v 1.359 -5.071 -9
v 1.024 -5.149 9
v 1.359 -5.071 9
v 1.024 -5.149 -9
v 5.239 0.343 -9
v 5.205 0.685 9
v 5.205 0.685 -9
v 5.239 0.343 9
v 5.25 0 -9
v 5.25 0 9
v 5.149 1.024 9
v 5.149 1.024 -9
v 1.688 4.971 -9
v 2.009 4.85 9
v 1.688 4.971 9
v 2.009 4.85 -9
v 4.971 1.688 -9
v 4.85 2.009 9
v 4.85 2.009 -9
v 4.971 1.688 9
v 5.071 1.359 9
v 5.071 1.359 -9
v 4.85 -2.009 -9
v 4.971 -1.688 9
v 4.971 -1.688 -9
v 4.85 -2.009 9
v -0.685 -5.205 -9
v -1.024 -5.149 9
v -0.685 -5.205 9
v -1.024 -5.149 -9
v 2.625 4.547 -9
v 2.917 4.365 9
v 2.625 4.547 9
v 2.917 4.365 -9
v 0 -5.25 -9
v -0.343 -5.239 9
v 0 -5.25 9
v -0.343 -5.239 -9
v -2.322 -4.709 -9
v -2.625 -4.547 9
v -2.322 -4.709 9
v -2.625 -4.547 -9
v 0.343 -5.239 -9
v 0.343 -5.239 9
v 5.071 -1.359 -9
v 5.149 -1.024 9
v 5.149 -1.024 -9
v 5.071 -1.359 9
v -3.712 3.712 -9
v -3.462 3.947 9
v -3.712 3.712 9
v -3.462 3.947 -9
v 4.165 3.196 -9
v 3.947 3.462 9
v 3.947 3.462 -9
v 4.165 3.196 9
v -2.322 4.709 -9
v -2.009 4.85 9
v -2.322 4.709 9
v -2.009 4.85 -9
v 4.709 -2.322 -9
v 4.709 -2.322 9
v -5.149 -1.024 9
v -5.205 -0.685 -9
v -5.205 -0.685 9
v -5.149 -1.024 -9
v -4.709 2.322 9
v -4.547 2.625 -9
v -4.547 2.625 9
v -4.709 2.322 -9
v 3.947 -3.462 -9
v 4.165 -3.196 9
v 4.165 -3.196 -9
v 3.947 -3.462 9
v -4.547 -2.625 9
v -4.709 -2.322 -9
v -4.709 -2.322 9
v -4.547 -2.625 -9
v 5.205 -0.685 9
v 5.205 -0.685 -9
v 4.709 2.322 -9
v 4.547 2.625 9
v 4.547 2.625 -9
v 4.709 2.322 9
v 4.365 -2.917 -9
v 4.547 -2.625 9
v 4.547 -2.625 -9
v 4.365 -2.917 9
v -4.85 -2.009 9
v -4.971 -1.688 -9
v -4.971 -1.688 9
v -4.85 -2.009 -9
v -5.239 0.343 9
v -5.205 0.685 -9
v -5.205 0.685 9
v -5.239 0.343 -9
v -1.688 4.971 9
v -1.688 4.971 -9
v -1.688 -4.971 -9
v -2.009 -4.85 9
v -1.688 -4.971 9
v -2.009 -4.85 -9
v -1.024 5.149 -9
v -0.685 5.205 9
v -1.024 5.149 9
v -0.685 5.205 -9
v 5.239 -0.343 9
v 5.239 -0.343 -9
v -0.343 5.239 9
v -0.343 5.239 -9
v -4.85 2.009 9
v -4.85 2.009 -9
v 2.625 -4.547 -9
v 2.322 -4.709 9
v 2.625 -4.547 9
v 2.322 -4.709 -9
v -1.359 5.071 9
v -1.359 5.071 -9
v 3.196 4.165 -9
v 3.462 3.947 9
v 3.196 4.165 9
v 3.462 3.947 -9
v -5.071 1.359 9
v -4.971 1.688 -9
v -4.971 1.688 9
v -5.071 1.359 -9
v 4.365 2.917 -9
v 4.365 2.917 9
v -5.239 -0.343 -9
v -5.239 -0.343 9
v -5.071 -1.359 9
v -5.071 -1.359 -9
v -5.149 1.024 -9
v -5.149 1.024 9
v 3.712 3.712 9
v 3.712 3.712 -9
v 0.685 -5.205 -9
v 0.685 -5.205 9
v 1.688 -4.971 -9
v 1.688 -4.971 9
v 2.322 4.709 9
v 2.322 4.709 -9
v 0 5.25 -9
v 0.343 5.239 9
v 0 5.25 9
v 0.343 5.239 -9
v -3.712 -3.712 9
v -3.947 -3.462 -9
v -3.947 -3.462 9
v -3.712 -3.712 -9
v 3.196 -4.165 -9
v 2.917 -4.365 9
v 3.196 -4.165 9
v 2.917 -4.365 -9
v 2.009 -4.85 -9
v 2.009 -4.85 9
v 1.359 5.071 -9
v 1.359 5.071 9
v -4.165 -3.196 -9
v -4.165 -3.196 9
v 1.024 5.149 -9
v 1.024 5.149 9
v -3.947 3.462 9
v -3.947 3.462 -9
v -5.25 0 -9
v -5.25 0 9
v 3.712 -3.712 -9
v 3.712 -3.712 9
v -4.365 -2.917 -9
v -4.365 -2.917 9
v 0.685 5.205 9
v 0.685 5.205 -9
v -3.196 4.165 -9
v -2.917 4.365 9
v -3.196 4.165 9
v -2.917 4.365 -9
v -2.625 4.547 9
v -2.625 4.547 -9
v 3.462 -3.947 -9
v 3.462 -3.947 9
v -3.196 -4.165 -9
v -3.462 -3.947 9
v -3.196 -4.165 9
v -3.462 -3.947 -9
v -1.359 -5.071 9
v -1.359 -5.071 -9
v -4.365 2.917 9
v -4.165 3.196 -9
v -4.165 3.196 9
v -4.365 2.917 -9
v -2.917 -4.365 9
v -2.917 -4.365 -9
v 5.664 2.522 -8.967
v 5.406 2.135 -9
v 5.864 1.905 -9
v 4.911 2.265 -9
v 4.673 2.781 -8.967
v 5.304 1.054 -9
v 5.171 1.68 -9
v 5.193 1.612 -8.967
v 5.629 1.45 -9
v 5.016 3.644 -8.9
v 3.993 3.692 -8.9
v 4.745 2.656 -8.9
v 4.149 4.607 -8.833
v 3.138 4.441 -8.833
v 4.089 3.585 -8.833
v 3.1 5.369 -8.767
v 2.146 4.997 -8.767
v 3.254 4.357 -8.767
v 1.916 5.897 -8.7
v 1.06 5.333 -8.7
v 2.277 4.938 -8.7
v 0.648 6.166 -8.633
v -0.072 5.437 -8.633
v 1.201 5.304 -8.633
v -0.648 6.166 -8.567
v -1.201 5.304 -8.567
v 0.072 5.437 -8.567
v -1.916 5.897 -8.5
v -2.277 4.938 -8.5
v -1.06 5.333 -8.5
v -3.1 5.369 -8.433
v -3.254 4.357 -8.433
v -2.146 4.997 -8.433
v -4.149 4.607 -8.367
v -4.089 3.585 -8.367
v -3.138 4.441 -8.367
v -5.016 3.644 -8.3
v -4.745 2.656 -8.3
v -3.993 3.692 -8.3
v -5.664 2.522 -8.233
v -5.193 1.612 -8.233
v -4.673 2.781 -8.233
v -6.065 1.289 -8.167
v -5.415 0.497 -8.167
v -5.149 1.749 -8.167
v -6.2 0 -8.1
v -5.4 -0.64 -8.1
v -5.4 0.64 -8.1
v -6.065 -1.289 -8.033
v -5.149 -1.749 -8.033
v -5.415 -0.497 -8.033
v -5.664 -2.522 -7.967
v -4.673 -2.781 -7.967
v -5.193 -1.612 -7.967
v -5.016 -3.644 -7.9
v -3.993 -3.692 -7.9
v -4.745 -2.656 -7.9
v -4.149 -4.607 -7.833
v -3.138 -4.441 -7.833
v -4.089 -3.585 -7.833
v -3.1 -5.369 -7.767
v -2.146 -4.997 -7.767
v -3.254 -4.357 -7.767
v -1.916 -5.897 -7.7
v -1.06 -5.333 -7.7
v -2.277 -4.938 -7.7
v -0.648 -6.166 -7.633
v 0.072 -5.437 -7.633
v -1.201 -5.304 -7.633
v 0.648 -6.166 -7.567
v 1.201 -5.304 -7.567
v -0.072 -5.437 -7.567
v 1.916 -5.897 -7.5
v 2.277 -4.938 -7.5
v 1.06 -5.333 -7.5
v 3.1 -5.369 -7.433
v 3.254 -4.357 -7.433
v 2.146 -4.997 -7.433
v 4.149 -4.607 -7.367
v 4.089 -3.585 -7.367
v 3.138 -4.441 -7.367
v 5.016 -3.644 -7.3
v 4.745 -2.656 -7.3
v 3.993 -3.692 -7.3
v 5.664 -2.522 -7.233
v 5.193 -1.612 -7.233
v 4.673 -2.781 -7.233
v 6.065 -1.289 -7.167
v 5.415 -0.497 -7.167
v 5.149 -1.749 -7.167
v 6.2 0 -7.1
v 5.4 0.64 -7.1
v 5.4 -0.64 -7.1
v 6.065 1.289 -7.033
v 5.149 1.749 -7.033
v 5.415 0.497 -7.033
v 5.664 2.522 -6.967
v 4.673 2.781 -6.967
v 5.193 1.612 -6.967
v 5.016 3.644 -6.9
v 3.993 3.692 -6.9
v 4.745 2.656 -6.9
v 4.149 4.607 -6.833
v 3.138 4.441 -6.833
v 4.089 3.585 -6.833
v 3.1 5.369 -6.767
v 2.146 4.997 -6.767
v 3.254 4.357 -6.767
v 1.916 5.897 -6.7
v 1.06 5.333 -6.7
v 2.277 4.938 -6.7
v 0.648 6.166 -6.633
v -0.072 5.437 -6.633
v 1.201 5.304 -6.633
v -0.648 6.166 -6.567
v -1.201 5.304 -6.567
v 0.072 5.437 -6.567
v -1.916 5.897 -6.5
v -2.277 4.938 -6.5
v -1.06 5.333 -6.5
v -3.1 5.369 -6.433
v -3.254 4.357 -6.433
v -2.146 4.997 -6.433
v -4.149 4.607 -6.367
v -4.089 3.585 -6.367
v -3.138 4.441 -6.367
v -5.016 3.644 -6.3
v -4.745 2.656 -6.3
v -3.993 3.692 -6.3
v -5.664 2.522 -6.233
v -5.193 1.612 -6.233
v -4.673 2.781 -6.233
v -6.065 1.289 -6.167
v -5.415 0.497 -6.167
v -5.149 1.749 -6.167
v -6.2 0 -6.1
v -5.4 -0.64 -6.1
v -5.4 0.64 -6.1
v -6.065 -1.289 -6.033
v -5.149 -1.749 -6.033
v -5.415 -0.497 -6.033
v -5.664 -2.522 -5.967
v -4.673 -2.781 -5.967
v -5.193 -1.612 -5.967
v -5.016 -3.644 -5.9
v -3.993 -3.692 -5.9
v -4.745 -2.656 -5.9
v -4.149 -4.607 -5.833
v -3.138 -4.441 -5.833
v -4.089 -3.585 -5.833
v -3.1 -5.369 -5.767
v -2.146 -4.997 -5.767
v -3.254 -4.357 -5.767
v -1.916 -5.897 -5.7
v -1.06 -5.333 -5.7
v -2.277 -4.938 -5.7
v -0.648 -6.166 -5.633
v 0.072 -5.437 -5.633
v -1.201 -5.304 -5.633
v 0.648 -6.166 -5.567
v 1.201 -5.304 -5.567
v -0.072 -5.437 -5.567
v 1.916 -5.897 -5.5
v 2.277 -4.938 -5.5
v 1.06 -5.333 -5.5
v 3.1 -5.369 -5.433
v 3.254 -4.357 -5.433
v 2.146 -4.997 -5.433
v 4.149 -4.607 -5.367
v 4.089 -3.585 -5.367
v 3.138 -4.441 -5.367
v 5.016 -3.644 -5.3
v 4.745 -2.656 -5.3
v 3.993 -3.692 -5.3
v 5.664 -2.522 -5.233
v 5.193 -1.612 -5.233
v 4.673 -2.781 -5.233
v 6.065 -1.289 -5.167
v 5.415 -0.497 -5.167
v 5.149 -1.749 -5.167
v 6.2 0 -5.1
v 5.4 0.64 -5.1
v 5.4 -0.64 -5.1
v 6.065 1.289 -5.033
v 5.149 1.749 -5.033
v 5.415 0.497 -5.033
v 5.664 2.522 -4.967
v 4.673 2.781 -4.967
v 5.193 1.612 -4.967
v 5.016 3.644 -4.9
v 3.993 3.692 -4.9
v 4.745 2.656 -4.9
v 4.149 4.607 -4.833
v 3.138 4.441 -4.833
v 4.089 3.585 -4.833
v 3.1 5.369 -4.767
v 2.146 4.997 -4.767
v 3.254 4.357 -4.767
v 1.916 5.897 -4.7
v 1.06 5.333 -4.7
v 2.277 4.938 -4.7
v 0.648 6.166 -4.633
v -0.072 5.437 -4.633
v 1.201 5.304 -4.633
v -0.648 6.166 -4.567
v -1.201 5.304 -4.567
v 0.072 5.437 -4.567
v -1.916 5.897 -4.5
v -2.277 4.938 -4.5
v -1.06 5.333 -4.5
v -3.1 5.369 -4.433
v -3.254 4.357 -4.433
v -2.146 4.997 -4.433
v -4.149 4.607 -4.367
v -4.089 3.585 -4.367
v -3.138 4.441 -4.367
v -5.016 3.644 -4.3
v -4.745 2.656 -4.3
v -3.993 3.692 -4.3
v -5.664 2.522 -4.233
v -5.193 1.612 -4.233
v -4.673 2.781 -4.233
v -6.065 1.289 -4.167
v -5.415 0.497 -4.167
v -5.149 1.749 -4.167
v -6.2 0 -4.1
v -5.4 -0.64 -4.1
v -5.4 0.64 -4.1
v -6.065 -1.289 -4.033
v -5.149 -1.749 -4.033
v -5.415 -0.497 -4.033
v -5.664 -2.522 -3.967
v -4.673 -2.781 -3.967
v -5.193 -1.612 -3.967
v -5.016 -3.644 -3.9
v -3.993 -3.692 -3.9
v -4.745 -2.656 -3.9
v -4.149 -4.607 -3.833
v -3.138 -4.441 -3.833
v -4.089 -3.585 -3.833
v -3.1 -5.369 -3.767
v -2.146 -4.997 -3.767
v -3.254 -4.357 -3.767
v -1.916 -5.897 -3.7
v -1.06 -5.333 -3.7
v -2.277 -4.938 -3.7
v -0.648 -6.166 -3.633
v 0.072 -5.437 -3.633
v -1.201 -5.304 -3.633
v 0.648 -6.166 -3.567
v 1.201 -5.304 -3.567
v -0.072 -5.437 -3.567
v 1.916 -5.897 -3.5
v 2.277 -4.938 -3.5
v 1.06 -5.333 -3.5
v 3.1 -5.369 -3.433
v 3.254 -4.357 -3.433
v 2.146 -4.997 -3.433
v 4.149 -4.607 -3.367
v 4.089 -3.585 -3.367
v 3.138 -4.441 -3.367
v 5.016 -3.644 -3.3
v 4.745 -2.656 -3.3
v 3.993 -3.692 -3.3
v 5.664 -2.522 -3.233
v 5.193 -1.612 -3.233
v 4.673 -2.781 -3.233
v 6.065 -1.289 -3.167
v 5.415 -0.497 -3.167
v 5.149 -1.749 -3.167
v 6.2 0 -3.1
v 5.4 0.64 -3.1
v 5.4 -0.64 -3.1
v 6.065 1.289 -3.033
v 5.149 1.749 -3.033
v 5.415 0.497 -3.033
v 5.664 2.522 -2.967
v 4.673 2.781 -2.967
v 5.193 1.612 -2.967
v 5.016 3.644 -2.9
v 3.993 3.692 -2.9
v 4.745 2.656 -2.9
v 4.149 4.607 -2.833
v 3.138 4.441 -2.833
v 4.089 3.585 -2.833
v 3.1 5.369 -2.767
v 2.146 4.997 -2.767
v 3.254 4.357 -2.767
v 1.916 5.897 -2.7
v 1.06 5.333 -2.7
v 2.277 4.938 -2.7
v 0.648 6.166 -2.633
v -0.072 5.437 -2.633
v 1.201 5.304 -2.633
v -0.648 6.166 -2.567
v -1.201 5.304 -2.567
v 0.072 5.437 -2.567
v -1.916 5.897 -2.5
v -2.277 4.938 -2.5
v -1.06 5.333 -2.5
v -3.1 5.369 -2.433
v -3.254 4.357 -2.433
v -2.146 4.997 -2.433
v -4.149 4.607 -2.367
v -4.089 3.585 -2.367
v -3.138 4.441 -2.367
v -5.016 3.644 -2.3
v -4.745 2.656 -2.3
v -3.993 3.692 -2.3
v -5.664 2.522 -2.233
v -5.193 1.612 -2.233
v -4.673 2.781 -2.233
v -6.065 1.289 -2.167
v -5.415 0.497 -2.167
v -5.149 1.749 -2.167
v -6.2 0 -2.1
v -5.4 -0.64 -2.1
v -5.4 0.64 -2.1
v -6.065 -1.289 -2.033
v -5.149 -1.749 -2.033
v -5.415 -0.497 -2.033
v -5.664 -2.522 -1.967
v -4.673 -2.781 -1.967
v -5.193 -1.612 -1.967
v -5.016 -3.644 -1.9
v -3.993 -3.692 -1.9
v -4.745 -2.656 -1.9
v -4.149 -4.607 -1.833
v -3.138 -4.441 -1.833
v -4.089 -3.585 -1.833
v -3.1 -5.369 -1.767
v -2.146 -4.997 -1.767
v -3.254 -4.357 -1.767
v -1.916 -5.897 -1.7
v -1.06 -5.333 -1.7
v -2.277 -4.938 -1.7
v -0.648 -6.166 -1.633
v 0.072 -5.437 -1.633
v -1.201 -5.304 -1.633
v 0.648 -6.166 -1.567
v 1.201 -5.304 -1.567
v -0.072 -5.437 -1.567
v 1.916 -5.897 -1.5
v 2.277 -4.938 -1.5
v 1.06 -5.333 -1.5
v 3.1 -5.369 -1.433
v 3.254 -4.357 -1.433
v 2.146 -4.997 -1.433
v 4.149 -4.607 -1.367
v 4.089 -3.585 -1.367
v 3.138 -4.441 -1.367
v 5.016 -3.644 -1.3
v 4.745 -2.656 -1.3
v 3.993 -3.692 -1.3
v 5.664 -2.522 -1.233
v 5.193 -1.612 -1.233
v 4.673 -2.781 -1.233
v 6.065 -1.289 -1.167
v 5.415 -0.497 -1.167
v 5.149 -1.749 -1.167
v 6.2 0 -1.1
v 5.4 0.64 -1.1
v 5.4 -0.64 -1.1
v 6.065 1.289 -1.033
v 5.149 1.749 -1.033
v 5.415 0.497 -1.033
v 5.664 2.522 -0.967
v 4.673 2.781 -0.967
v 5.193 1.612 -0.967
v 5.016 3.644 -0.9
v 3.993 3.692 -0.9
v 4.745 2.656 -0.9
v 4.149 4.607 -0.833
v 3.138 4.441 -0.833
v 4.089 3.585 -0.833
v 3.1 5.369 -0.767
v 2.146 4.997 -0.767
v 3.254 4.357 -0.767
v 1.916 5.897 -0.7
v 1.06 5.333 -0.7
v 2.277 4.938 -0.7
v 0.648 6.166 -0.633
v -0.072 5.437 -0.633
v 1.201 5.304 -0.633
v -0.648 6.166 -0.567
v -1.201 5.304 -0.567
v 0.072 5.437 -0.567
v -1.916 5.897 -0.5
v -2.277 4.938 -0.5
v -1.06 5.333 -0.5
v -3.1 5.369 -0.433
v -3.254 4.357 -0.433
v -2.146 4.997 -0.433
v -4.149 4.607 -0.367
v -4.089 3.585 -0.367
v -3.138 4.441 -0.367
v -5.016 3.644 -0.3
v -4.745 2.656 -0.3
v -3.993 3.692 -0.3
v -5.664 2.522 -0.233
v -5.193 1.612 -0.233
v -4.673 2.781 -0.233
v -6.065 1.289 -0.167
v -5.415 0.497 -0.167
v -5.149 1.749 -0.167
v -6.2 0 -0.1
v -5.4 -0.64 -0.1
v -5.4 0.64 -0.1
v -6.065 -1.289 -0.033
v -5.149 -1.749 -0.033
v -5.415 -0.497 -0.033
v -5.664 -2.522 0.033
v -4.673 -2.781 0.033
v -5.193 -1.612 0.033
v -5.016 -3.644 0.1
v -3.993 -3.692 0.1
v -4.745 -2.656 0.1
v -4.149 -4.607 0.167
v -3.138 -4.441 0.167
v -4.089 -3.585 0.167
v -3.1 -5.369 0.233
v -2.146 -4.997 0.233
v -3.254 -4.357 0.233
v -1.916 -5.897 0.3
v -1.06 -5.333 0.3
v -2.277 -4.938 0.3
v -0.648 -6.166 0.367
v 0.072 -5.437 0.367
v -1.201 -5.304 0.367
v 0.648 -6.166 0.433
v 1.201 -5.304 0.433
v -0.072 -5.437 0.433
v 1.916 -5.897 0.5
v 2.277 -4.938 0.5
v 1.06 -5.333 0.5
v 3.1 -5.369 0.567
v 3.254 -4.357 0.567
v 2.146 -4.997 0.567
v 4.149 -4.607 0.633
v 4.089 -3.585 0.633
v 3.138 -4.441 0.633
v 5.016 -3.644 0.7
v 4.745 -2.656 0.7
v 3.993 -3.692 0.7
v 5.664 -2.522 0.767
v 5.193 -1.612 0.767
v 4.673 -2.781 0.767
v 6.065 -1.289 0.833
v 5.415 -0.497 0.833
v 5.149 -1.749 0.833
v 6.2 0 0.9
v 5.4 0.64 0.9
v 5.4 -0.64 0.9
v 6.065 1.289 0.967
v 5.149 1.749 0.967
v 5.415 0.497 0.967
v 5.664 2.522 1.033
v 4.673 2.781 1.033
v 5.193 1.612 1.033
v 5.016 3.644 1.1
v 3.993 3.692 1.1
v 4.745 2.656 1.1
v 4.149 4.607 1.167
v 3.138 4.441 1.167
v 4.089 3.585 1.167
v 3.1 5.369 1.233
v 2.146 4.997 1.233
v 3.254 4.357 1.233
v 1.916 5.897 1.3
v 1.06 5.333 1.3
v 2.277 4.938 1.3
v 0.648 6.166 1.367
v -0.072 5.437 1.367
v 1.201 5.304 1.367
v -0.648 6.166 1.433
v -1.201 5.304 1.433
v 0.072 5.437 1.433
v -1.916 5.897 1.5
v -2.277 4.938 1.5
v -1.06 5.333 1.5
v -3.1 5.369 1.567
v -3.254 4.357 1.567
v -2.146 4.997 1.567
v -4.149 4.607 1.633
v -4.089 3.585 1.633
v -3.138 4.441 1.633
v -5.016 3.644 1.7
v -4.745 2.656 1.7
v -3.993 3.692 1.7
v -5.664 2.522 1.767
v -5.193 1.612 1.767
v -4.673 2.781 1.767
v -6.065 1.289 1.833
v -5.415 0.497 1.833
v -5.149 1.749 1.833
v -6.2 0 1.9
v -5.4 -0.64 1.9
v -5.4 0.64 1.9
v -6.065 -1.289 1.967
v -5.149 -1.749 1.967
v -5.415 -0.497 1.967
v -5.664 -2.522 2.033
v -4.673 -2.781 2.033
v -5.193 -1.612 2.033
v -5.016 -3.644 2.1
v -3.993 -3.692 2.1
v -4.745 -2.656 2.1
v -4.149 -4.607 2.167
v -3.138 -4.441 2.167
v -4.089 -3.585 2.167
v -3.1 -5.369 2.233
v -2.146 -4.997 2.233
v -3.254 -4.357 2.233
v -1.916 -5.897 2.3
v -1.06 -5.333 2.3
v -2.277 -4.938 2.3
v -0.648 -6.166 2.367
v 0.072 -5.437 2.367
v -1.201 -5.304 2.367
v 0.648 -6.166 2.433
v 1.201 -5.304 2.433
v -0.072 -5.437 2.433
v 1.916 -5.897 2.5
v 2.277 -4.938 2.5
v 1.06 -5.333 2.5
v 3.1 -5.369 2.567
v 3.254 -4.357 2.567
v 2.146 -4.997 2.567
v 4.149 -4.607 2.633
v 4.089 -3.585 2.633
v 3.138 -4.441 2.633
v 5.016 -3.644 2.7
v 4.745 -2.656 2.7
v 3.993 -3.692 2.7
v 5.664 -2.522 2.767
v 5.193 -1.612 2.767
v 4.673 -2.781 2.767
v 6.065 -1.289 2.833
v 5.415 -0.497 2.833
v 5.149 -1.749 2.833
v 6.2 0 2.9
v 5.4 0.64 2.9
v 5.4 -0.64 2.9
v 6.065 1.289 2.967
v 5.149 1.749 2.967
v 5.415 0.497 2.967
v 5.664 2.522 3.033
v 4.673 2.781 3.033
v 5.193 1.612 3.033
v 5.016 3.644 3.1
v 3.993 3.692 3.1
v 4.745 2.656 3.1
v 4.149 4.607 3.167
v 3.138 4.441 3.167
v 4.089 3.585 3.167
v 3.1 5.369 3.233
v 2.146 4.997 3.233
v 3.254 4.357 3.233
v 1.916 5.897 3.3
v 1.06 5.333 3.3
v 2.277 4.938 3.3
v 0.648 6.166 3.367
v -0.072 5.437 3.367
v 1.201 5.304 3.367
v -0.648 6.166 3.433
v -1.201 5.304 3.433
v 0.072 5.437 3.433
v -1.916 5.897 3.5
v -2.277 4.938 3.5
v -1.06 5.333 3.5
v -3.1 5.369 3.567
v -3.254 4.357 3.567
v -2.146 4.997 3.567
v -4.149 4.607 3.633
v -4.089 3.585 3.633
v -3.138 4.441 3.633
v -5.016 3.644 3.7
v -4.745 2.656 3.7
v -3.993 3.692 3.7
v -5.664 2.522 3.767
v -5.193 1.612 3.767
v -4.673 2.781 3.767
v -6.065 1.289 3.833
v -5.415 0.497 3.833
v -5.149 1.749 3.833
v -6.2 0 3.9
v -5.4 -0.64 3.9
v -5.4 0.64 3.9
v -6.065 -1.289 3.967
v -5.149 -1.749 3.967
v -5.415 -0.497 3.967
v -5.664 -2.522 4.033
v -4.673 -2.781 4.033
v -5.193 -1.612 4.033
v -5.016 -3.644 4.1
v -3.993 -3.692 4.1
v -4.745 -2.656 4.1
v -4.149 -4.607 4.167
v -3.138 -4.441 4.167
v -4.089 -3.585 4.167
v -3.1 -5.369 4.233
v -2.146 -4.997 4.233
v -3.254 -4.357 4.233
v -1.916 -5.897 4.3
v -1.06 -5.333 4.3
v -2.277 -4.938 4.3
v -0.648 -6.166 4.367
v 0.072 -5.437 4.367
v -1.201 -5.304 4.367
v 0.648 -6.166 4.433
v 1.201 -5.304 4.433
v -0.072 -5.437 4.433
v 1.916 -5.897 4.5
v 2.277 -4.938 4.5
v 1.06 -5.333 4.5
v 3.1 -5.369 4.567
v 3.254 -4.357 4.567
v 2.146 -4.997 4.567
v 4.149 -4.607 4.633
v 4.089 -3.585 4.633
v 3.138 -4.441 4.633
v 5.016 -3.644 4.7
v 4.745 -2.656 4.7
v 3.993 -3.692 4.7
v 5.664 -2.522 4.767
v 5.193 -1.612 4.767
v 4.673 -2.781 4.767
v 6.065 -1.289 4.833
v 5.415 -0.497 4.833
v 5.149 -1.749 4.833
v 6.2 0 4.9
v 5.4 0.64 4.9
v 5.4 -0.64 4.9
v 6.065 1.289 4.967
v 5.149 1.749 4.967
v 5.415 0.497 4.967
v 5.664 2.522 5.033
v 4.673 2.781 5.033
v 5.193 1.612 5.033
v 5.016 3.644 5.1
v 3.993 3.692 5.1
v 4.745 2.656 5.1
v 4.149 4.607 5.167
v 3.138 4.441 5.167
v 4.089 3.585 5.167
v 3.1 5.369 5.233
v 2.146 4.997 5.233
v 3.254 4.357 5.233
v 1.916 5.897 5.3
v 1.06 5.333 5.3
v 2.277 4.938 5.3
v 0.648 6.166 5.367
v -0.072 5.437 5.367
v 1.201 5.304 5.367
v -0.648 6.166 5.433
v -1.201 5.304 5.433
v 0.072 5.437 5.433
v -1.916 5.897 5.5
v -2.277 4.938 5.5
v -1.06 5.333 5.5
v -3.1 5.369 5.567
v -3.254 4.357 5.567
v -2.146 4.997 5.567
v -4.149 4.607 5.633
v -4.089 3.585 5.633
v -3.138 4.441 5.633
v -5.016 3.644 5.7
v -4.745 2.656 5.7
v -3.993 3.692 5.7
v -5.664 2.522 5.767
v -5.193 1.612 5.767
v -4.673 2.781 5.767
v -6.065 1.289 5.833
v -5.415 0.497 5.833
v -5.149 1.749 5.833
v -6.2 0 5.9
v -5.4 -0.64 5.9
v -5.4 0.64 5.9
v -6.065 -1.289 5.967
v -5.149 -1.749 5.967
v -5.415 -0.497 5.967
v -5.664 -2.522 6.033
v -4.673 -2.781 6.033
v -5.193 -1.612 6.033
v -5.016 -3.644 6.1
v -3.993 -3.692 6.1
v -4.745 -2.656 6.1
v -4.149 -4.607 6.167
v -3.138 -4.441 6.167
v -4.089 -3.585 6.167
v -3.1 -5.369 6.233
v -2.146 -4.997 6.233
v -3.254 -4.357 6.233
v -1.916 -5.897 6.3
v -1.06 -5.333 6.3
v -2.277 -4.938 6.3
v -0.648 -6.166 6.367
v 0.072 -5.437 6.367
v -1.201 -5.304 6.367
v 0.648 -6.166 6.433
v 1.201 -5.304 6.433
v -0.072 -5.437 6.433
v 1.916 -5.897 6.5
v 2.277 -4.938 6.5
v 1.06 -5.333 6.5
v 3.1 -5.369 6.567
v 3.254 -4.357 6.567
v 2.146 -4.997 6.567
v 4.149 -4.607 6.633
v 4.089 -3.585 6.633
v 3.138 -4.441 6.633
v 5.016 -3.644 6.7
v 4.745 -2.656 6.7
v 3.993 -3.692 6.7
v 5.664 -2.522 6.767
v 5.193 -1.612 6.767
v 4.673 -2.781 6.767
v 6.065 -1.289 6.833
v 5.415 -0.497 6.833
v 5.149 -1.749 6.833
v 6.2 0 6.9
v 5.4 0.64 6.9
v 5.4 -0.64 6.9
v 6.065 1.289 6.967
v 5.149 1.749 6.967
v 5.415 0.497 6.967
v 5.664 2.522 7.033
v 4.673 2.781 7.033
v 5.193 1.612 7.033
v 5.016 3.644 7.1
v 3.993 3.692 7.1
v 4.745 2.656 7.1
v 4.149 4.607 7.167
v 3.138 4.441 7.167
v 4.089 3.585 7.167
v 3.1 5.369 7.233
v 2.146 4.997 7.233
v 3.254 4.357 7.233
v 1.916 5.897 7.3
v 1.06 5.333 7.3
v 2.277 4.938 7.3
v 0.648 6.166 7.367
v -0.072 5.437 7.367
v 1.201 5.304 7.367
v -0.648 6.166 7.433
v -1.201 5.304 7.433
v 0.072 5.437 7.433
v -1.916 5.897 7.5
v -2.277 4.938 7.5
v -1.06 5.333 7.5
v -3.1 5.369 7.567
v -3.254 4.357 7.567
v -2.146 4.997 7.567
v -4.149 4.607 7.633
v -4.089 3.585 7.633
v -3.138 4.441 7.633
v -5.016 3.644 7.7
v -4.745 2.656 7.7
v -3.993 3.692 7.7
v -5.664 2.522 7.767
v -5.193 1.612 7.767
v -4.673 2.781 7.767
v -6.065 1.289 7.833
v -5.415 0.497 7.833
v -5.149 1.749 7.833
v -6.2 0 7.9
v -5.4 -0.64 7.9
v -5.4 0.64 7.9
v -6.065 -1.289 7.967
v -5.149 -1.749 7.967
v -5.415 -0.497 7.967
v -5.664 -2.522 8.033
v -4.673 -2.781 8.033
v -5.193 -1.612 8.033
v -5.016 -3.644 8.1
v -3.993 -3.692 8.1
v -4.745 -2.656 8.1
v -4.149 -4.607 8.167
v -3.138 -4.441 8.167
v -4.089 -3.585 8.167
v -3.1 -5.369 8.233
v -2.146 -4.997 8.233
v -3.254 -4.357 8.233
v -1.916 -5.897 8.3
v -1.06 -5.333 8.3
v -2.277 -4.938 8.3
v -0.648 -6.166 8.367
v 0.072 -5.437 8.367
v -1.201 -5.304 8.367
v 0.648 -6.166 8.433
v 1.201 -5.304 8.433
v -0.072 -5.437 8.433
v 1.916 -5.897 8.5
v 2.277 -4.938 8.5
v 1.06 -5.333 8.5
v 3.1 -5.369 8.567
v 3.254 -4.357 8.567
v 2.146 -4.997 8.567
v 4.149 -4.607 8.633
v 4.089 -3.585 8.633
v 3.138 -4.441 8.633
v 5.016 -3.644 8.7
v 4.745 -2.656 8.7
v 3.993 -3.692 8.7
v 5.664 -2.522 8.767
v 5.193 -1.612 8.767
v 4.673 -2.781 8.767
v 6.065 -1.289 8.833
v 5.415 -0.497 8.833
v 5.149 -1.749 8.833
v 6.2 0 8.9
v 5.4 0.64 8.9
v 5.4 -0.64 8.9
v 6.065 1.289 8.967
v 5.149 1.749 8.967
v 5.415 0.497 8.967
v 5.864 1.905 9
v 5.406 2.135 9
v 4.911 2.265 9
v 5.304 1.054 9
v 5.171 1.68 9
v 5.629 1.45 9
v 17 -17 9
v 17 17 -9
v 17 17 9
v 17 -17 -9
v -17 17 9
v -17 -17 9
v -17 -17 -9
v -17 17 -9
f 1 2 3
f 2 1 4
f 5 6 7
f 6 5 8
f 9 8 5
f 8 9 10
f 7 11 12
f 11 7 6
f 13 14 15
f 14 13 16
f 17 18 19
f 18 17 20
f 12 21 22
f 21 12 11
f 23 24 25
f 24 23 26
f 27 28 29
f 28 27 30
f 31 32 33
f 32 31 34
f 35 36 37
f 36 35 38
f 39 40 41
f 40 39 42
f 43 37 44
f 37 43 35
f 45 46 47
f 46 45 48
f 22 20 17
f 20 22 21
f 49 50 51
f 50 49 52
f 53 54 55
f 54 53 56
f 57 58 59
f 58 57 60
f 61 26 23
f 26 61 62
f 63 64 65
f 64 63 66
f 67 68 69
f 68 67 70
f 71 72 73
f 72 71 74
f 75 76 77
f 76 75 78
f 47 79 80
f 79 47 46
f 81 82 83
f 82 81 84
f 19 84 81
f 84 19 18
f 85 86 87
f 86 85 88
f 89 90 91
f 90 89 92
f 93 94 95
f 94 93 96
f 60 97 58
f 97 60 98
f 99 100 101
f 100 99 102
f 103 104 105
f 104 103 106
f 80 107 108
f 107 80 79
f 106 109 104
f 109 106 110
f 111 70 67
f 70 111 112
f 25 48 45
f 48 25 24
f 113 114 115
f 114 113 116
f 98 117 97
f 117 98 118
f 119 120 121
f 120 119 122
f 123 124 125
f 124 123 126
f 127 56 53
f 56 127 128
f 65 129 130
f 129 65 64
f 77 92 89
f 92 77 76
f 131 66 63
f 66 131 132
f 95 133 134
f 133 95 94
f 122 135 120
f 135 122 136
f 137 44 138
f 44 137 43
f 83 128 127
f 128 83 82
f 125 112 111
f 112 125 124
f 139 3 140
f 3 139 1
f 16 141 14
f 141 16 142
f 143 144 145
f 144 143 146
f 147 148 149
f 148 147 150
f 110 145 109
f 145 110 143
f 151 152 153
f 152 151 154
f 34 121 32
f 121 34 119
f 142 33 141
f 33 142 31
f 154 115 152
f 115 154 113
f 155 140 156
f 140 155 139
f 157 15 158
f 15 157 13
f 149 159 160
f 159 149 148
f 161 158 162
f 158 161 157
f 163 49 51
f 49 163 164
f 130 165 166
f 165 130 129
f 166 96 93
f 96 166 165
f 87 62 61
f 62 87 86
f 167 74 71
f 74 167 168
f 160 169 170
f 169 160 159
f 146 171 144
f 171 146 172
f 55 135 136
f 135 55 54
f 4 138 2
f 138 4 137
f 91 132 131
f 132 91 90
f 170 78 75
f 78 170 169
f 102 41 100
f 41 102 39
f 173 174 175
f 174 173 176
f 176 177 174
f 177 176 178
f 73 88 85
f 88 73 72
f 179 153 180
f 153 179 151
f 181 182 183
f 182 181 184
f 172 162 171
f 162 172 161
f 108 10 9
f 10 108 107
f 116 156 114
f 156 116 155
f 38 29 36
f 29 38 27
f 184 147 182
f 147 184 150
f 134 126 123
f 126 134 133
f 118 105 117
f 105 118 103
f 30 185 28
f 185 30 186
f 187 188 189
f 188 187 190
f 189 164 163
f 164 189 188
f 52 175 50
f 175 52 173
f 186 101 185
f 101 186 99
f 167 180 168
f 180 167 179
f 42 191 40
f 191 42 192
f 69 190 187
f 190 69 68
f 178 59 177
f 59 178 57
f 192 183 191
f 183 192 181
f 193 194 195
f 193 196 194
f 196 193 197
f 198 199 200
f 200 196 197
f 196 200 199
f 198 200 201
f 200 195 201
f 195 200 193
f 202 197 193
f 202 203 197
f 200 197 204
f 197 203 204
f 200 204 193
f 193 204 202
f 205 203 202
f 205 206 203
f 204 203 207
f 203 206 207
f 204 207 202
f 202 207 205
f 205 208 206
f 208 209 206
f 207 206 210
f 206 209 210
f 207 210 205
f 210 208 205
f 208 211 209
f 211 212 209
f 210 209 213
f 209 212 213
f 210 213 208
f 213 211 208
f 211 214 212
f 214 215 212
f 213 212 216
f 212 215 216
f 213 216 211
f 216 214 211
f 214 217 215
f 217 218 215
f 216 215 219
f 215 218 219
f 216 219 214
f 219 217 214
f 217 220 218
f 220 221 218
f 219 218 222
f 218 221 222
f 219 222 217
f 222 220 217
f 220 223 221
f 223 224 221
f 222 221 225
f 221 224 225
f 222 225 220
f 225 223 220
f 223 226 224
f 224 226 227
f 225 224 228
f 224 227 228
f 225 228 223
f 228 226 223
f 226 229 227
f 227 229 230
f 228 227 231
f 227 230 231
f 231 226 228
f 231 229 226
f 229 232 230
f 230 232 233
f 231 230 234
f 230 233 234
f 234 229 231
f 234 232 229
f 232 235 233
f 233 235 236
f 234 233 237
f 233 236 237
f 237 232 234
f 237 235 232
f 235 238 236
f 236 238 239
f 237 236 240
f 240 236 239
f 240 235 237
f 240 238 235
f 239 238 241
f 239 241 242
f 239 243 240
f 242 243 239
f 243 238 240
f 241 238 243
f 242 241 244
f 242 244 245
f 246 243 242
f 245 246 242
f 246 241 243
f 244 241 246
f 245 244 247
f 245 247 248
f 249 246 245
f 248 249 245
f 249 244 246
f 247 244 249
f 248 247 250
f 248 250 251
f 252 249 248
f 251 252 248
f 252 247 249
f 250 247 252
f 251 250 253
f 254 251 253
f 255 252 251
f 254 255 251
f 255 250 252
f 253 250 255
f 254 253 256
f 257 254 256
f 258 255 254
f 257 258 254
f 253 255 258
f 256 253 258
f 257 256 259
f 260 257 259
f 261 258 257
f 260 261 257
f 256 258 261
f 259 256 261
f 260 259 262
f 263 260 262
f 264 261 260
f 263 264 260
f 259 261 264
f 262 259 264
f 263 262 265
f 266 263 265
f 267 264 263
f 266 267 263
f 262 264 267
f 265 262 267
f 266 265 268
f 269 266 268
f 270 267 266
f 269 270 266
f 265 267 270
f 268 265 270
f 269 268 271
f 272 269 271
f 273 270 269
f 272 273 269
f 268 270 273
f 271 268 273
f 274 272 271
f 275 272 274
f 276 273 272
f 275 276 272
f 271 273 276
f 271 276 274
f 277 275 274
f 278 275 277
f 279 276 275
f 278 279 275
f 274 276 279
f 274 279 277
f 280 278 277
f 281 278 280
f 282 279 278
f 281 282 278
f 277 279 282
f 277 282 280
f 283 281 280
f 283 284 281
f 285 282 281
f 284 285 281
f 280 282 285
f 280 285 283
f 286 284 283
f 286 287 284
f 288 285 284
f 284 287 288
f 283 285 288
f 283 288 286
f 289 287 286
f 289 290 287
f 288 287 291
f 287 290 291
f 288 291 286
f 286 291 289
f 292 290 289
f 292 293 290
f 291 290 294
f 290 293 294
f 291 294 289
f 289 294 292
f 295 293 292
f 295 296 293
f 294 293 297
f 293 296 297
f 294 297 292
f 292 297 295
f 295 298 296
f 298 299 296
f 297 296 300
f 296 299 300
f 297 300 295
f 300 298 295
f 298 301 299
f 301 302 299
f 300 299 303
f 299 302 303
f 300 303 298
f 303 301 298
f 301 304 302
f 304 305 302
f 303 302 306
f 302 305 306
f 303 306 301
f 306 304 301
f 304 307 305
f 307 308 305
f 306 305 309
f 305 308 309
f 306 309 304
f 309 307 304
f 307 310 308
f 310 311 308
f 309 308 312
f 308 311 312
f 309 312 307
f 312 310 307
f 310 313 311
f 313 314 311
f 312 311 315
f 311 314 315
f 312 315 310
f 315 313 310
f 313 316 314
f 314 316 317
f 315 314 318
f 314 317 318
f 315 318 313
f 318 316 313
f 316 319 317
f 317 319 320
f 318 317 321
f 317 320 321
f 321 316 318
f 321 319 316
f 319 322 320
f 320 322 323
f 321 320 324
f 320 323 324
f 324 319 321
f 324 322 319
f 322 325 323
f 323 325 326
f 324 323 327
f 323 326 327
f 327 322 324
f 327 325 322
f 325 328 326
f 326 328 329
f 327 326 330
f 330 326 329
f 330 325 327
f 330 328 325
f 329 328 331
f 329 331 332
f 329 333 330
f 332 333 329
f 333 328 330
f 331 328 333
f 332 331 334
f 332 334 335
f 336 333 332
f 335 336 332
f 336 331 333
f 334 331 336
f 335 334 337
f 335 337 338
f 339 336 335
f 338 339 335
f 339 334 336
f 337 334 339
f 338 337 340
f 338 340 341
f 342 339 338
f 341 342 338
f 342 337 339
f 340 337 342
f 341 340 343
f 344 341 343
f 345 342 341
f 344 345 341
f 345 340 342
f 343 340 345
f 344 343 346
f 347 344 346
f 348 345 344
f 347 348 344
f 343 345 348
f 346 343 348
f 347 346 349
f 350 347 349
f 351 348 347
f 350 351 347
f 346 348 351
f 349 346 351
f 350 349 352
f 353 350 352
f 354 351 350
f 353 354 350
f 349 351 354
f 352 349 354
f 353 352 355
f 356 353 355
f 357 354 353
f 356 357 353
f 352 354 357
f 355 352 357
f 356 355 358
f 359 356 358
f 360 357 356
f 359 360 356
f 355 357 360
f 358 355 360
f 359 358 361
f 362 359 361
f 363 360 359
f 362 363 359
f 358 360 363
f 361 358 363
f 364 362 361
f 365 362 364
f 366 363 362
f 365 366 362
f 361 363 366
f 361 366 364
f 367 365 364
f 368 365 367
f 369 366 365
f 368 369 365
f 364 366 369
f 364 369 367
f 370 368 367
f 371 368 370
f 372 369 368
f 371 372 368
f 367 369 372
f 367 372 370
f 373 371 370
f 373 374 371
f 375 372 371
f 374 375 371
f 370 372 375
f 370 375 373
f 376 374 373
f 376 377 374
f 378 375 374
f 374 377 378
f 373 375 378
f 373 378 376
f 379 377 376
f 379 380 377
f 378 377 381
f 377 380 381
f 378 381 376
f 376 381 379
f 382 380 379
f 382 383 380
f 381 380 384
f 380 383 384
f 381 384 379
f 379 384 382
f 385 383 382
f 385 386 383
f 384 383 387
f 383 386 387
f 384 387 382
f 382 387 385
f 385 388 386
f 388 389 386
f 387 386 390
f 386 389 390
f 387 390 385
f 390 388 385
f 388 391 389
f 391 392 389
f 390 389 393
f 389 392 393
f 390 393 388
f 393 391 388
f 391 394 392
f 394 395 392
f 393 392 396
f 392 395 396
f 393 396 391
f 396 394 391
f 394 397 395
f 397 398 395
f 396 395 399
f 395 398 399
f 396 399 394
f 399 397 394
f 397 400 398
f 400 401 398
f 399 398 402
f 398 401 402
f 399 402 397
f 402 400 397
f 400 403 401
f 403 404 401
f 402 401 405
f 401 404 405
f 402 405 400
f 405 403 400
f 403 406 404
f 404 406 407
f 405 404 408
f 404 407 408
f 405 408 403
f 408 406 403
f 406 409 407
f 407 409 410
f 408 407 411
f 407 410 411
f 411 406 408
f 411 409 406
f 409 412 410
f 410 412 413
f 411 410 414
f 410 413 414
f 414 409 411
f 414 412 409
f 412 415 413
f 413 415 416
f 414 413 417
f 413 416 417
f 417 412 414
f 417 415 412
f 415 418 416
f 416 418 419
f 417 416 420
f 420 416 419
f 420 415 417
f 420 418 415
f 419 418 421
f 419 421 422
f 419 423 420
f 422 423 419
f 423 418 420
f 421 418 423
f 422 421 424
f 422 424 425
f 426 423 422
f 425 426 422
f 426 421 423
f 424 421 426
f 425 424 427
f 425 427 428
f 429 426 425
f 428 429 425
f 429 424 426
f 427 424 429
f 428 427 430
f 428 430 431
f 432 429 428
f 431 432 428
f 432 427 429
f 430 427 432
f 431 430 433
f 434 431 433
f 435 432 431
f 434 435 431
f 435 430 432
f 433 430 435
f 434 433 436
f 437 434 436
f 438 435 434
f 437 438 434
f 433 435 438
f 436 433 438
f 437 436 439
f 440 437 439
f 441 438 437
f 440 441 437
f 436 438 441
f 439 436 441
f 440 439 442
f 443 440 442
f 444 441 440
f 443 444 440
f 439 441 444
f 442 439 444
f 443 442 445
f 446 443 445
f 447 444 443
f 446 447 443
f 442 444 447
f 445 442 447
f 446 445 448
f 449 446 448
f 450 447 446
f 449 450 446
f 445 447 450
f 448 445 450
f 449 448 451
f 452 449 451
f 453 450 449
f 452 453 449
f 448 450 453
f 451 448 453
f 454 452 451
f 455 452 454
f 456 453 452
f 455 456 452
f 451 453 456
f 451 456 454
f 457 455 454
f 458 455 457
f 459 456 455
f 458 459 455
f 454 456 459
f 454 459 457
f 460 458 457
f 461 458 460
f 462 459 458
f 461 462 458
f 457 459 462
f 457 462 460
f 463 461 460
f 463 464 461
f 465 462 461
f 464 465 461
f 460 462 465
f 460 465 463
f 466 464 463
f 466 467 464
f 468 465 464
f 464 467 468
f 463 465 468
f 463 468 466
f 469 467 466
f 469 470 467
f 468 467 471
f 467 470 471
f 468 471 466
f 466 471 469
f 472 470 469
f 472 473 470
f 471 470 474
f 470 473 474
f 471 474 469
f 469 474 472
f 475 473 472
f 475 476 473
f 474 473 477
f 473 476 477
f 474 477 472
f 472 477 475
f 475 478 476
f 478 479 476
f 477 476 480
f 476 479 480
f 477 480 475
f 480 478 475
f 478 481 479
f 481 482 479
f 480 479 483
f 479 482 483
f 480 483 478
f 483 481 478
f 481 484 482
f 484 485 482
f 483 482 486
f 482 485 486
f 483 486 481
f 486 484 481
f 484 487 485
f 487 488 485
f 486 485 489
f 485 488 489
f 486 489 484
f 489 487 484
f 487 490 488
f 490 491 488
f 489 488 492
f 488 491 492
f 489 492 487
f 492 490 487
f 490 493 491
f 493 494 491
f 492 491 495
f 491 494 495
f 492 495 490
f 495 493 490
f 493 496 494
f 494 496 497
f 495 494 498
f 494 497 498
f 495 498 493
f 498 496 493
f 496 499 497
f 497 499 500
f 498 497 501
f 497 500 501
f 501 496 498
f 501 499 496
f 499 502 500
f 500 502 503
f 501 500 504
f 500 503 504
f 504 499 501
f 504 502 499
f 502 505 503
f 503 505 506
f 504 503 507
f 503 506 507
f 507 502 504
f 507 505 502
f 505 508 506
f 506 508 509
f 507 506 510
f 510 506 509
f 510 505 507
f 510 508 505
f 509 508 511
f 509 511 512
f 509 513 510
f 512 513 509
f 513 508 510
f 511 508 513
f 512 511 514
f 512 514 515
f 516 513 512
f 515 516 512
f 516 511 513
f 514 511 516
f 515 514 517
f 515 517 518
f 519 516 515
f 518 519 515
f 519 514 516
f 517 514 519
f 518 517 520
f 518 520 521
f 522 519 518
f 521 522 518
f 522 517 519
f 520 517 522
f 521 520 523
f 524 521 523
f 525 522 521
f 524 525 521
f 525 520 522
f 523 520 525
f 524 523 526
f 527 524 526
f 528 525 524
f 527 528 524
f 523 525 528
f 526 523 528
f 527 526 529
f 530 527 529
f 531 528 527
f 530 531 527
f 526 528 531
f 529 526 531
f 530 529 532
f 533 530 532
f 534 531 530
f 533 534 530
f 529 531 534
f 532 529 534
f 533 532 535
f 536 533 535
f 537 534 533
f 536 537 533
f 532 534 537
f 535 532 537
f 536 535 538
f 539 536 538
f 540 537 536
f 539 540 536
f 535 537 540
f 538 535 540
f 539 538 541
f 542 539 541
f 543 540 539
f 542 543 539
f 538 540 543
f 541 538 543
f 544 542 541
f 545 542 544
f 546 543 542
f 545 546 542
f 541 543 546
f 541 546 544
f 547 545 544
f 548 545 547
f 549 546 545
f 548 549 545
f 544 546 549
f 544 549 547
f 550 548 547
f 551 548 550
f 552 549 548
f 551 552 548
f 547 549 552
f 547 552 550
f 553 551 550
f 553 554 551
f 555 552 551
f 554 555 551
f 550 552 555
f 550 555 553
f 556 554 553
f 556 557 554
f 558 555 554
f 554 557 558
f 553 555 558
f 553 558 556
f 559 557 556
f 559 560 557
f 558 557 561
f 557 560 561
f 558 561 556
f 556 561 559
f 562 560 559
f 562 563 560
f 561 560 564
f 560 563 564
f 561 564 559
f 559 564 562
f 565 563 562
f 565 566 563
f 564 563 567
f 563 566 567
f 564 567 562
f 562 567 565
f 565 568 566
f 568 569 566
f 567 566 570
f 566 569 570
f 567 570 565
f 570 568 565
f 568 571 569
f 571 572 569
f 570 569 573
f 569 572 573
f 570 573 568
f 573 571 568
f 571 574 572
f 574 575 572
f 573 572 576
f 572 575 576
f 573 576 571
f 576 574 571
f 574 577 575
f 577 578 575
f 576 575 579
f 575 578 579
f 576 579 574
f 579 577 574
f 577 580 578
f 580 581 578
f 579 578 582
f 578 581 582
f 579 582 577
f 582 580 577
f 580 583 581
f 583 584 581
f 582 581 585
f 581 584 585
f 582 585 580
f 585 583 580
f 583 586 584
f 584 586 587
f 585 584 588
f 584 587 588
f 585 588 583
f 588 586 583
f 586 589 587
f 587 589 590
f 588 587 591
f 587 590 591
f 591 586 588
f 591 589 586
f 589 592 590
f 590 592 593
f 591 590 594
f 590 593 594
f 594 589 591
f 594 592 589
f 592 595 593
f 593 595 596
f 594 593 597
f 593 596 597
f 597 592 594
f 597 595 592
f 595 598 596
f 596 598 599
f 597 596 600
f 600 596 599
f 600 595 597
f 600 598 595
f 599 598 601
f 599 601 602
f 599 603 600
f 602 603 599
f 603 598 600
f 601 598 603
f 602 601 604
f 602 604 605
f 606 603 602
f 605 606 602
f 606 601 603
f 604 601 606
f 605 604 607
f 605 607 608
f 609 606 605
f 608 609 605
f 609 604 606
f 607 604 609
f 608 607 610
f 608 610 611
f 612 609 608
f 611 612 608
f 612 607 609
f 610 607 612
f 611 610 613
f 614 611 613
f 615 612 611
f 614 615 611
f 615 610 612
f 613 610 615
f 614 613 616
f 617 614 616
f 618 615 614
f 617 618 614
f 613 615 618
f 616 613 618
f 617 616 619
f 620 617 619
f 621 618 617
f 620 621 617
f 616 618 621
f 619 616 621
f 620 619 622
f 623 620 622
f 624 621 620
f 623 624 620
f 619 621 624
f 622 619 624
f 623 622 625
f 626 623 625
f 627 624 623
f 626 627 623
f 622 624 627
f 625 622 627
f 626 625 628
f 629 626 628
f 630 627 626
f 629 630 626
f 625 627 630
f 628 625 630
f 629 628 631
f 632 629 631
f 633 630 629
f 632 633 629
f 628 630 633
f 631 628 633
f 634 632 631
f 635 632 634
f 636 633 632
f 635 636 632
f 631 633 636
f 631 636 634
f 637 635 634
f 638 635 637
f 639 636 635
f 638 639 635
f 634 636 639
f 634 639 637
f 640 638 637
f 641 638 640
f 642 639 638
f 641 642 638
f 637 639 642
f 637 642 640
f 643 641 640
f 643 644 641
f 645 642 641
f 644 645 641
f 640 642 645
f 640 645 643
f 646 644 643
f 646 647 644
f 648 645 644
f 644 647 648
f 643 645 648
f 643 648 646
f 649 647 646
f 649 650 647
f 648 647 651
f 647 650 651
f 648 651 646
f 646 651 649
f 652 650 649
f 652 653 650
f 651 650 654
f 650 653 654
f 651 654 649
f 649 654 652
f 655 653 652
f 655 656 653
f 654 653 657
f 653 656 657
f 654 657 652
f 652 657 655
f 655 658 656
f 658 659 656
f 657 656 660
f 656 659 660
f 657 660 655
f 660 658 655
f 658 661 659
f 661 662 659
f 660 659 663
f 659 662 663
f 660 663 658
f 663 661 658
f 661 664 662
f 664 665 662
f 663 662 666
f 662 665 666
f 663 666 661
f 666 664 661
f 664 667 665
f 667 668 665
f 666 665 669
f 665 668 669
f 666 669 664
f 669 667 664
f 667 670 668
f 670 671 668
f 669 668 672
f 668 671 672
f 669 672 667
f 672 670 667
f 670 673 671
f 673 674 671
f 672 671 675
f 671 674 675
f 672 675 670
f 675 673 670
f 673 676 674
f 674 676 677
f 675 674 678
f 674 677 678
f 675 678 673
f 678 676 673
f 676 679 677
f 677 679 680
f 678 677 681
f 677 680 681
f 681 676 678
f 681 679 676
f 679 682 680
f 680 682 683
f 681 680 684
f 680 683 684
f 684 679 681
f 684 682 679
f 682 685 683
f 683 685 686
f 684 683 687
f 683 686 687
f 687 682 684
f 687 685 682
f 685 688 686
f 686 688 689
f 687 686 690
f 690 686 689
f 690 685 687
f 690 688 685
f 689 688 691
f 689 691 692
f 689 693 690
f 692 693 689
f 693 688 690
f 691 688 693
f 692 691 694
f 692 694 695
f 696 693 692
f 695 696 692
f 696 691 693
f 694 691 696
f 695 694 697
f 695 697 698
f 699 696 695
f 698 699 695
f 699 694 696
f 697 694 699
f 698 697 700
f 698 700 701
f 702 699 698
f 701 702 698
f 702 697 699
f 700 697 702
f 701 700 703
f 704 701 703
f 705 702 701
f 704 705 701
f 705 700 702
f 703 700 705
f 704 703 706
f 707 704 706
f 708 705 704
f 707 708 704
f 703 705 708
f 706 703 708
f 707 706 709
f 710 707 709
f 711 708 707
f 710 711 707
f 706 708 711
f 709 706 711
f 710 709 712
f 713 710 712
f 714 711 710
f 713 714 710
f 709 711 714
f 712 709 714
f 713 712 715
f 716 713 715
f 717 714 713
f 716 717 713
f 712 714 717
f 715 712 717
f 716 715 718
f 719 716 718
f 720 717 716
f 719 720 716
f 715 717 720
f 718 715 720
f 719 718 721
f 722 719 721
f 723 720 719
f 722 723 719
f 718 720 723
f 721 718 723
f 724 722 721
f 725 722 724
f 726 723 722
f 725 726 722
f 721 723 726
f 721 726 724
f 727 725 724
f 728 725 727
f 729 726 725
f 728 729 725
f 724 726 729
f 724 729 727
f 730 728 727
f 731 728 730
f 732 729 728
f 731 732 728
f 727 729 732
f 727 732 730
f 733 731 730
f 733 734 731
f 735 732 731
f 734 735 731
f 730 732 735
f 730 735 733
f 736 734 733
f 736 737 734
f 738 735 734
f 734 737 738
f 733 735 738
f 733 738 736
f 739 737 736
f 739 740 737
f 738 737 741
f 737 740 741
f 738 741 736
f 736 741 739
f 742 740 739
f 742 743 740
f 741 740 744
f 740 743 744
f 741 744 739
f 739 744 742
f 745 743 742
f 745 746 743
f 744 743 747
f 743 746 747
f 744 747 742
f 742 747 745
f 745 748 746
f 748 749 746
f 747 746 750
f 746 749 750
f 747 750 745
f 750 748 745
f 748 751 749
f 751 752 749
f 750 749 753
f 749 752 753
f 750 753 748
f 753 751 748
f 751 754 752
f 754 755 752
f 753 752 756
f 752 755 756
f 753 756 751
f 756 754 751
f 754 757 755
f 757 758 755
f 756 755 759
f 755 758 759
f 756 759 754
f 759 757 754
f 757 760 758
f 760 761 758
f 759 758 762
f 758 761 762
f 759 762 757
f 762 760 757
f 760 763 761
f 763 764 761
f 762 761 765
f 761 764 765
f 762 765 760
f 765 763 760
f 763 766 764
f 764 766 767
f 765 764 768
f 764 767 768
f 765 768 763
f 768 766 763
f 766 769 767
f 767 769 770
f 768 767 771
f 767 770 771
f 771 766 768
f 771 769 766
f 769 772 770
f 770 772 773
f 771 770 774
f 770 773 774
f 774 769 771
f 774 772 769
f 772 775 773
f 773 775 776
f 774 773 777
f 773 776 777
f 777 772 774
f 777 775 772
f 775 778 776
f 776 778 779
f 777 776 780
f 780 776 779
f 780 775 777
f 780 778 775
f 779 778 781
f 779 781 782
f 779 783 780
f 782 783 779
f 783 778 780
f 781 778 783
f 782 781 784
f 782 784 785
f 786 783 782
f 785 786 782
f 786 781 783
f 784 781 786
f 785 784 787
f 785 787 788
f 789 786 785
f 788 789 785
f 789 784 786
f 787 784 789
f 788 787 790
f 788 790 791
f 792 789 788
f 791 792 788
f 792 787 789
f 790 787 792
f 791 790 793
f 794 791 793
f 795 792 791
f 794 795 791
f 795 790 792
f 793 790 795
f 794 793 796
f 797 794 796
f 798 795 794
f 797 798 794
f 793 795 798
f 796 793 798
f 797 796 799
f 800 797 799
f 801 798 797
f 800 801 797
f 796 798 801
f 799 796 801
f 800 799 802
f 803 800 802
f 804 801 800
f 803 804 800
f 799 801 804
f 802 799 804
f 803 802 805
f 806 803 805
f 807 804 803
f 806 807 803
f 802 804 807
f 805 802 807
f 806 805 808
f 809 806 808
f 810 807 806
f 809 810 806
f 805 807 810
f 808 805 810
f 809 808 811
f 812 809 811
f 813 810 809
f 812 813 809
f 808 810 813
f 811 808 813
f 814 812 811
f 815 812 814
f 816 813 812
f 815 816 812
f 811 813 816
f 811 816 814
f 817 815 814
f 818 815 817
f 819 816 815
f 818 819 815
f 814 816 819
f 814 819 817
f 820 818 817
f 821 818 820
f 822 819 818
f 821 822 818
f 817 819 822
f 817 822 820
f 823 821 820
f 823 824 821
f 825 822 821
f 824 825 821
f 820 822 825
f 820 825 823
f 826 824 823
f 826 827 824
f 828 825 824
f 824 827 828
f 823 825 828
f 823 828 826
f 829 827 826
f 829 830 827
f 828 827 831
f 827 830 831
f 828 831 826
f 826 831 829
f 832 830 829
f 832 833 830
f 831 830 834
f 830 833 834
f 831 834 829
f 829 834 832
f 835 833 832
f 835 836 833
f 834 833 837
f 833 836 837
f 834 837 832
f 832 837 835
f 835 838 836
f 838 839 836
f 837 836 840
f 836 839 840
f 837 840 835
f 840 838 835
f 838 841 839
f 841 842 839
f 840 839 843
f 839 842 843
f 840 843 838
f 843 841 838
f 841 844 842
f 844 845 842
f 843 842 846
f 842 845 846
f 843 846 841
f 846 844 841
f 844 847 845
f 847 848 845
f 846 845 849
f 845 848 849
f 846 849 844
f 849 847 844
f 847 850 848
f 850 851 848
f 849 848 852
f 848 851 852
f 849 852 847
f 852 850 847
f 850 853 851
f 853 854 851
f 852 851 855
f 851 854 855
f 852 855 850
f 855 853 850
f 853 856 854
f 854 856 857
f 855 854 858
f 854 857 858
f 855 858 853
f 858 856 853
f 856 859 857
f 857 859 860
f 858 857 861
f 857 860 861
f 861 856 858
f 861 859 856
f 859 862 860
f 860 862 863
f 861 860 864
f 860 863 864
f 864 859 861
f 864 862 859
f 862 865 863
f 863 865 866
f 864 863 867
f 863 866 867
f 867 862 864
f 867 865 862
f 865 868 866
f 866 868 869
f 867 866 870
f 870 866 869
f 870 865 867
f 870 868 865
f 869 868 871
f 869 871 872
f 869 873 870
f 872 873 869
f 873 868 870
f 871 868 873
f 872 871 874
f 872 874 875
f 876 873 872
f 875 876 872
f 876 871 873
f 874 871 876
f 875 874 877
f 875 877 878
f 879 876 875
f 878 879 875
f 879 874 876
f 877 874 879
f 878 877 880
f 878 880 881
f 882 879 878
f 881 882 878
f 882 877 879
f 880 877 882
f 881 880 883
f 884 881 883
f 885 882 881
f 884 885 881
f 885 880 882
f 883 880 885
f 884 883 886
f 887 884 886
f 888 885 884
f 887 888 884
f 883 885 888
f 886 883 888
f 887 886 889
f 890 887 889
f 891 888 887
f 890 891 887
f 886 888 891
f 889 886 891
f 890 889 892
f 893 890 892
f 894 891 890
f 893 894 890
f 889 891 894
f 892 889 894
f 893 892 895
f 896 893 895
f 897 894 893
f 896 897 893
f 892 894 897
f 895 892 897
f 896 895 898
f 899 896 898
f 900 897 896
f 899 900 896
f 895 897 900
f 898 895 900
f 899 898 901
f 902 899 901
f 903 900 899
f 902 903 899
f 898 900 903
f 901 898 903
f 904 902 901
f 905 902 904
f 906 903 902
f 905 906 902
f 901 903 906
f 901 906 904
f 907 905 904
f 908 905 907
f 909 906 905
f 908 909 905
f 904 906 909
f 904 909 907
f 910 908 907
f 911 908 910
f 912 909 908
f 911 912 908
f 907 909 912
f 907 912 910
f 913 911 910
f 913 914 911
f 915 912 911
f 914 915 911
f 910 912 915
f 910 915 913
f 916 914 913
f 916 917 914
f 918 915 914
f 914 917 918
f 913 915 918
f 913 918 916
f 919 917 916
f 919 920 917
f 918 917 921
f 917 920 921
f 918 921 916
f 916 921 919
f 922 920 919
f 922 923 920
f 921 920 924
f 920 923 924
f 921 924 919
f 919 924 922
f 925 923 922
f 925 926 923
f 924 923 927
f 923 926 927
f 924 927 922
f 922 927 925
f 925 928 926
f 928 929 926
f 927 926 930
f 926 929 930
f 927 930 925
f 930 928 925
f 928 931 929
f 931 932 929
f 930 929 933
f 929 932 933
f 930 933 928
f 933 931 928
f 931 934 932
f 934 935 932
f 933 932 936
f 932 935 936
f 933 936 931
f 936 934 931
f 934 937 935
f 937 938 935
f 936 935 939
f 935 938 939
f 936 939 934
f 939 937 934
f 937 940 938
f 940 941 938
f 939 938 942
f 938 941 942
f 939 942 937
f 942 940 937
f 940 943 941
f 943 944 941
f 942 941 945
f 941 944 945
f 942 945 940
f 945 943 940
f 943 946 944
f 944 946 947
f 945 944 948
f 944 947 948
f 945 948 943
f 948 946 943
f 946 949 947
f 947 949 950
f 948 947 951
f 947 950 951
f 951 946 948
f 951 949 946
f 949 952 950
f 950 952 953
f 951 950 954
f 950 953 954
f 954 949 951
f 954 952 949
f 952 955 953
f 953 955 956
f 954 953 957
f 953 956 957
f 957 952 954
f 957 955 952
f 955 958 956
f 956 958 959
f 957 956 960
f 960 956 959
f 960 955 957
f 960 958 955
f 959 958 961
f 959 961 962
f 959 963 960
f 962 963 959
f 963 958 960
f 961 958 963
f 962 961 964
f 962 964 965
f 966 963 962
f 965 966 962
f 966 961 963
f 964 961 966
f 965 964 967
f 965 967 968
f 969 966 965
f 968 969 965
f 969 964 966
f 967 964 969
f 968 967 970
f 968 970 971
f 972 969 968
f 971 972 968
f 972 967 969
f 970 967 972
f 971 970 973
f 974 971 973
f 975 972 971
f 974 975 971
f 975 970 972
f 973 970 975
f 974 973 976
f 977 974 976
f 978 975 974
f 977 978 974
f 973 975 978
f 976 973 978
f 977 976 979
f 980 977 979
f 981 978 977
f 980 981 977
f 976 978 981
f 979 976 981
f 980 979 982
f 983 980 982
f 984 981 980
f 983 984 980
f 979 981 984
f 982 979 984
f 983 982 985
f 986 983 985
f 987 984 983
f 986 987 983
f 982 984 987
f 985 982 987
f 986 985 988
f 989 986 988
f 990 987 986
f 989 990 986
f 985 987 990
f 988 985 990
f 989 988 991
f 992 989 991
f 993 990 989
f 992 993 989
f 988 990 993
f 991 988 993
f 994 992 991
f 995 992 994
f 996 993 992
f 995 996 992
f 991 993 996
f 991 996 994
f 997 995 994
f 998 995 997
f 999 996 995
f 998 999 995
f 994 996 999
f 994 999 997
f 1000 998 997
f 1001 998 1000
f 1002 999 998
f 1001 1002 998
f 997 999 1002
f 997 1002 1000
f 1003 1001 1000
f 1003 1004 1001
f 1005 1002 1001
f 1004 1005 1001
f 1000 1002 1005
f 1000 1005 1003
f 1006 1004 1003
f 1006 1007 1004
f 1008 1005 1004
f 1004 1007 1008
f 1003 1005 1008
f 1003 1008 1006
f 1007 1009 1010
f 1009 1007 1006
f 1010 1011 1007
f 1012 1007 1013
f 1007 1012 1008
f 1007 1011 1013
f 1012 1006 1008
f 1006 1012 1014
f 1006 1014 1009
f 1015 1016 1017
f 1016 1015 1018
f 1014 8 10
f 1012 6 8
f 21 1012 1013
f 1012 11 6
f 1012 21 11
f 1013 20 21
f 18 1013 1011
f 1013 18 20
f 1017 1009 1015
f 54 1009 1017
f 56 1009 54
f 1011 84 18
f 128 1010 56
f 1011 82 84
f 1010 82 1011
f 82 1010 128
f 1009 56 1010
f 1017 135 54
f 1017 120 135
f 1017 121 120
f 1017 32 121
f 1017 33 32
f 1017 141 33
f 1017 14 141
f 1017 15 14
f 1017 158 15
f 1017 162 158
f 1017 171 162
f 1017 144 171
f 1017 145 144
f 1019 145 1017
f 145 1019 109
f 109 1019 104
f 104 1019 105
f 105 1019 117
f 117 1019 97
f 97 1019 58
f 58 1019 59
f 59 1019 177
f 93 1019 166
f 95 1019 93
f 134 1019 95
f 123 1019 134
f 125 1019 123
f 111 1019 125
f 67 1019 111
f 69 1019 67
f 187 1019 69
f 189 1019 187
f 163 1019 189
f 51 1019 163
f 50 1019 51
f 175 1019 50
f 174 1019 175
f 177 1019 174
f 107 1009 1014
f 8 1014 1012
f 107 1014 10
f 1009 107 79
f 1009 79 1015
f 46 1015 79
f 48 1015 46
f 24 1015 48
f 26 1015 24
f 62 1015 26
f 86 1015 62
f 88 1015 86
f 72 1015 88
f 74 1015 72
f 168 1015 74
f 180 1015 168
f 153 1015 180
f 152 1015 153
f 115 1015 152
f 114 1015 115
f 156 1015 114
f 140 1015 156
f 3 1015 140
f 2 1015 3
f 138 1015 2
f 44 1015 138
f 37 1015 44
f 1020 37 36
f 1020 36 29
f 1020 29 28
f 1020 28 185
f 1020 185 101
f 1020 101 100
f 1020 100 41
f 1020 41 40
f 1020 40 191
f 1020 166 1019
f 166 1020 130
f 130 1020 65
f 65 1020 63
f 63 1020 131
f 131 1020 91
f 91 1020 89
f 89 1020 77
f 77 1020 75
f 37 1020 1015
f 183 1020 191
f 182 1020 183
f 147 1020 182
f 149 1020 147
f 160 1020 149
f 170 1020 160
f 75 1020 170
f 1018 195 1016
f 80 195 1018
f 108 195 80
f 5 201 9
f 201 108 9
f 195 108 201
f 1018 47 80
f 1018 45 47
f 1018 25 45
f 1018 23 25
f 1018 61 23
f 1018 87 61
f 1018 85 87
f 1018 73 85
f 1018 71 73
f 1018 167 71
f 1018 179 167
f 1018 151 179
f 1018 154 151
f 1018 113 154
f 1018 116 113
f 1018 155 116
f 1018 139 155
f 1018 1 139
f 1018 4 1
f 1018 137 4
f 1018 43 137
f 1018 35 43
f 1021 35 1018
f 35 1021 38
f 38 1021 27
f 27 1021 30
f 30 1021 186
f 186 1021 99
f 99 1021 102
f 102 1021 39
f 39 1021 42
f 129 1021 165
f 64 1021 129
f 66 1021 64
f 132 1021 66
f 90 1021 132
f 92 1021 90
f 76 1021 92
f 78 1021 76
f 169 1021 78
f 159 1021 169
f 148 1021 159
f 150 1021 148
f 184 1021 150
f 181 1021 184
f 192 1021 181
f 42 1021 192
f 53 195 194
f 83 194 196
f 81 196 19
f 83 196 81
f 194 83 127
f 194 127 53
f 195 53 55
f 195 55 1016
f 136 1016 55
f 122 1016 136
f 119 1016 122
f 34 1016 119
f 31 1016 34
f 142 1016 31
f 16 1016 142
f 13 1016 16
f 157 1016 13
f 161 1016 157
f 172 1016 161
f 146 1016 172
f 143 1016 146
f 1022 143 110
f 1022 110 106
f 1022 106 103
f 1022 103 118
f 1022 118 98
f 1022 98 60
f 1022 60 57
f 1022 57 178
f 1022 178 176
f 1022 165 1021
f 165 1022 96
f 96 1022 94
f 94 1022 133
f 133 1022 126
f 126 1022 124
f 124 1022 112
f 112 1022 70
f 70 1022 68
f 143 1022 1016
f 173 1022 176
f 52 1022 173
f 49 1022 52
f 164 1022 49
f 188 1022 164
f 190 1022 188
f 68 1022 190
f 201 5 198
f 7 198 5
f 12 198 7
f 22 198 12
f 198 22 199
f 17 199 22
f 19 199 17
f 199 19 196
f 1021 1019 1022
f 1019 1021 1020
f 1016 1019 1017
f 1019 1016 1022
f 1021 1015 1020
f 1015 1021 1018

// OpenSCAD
// Threaded Hole Test Block
block_size = [34, 34, 18];
major_diameter = 12.4;
thread_pitch = 2;
thread_depth = 0.8;
pilot_diameter = 10.5;

$fn = $preview ? 48 : 96;

module helical_thread_cut(major_d, pitch, length, depth) {
  slices = max(36, ceil(length / pitch * 30));
  linear_extrude(height = length, twist = -360 * length / pitch, slices = slices, convexity = 10) {
    translate([major_d / 2 - depth, 0]) {
      polygon(points = [
        [0, -pitch * 0.32],
        [depth, 0],
        [0, pitch * 0.32]
      ]);
    }
  }
}

difference() {
  cube(block_size, center = true);

  translate([0, 0, -block_size[2] / 2 - 0.1]) {
    cylinder(h = block_size[2] + 0.2, d = pilot_diameter);
    helical_thread_cut(major_diameter, thread_pitch, block_size[2] + 0.2, thread_depth);
  }
}
